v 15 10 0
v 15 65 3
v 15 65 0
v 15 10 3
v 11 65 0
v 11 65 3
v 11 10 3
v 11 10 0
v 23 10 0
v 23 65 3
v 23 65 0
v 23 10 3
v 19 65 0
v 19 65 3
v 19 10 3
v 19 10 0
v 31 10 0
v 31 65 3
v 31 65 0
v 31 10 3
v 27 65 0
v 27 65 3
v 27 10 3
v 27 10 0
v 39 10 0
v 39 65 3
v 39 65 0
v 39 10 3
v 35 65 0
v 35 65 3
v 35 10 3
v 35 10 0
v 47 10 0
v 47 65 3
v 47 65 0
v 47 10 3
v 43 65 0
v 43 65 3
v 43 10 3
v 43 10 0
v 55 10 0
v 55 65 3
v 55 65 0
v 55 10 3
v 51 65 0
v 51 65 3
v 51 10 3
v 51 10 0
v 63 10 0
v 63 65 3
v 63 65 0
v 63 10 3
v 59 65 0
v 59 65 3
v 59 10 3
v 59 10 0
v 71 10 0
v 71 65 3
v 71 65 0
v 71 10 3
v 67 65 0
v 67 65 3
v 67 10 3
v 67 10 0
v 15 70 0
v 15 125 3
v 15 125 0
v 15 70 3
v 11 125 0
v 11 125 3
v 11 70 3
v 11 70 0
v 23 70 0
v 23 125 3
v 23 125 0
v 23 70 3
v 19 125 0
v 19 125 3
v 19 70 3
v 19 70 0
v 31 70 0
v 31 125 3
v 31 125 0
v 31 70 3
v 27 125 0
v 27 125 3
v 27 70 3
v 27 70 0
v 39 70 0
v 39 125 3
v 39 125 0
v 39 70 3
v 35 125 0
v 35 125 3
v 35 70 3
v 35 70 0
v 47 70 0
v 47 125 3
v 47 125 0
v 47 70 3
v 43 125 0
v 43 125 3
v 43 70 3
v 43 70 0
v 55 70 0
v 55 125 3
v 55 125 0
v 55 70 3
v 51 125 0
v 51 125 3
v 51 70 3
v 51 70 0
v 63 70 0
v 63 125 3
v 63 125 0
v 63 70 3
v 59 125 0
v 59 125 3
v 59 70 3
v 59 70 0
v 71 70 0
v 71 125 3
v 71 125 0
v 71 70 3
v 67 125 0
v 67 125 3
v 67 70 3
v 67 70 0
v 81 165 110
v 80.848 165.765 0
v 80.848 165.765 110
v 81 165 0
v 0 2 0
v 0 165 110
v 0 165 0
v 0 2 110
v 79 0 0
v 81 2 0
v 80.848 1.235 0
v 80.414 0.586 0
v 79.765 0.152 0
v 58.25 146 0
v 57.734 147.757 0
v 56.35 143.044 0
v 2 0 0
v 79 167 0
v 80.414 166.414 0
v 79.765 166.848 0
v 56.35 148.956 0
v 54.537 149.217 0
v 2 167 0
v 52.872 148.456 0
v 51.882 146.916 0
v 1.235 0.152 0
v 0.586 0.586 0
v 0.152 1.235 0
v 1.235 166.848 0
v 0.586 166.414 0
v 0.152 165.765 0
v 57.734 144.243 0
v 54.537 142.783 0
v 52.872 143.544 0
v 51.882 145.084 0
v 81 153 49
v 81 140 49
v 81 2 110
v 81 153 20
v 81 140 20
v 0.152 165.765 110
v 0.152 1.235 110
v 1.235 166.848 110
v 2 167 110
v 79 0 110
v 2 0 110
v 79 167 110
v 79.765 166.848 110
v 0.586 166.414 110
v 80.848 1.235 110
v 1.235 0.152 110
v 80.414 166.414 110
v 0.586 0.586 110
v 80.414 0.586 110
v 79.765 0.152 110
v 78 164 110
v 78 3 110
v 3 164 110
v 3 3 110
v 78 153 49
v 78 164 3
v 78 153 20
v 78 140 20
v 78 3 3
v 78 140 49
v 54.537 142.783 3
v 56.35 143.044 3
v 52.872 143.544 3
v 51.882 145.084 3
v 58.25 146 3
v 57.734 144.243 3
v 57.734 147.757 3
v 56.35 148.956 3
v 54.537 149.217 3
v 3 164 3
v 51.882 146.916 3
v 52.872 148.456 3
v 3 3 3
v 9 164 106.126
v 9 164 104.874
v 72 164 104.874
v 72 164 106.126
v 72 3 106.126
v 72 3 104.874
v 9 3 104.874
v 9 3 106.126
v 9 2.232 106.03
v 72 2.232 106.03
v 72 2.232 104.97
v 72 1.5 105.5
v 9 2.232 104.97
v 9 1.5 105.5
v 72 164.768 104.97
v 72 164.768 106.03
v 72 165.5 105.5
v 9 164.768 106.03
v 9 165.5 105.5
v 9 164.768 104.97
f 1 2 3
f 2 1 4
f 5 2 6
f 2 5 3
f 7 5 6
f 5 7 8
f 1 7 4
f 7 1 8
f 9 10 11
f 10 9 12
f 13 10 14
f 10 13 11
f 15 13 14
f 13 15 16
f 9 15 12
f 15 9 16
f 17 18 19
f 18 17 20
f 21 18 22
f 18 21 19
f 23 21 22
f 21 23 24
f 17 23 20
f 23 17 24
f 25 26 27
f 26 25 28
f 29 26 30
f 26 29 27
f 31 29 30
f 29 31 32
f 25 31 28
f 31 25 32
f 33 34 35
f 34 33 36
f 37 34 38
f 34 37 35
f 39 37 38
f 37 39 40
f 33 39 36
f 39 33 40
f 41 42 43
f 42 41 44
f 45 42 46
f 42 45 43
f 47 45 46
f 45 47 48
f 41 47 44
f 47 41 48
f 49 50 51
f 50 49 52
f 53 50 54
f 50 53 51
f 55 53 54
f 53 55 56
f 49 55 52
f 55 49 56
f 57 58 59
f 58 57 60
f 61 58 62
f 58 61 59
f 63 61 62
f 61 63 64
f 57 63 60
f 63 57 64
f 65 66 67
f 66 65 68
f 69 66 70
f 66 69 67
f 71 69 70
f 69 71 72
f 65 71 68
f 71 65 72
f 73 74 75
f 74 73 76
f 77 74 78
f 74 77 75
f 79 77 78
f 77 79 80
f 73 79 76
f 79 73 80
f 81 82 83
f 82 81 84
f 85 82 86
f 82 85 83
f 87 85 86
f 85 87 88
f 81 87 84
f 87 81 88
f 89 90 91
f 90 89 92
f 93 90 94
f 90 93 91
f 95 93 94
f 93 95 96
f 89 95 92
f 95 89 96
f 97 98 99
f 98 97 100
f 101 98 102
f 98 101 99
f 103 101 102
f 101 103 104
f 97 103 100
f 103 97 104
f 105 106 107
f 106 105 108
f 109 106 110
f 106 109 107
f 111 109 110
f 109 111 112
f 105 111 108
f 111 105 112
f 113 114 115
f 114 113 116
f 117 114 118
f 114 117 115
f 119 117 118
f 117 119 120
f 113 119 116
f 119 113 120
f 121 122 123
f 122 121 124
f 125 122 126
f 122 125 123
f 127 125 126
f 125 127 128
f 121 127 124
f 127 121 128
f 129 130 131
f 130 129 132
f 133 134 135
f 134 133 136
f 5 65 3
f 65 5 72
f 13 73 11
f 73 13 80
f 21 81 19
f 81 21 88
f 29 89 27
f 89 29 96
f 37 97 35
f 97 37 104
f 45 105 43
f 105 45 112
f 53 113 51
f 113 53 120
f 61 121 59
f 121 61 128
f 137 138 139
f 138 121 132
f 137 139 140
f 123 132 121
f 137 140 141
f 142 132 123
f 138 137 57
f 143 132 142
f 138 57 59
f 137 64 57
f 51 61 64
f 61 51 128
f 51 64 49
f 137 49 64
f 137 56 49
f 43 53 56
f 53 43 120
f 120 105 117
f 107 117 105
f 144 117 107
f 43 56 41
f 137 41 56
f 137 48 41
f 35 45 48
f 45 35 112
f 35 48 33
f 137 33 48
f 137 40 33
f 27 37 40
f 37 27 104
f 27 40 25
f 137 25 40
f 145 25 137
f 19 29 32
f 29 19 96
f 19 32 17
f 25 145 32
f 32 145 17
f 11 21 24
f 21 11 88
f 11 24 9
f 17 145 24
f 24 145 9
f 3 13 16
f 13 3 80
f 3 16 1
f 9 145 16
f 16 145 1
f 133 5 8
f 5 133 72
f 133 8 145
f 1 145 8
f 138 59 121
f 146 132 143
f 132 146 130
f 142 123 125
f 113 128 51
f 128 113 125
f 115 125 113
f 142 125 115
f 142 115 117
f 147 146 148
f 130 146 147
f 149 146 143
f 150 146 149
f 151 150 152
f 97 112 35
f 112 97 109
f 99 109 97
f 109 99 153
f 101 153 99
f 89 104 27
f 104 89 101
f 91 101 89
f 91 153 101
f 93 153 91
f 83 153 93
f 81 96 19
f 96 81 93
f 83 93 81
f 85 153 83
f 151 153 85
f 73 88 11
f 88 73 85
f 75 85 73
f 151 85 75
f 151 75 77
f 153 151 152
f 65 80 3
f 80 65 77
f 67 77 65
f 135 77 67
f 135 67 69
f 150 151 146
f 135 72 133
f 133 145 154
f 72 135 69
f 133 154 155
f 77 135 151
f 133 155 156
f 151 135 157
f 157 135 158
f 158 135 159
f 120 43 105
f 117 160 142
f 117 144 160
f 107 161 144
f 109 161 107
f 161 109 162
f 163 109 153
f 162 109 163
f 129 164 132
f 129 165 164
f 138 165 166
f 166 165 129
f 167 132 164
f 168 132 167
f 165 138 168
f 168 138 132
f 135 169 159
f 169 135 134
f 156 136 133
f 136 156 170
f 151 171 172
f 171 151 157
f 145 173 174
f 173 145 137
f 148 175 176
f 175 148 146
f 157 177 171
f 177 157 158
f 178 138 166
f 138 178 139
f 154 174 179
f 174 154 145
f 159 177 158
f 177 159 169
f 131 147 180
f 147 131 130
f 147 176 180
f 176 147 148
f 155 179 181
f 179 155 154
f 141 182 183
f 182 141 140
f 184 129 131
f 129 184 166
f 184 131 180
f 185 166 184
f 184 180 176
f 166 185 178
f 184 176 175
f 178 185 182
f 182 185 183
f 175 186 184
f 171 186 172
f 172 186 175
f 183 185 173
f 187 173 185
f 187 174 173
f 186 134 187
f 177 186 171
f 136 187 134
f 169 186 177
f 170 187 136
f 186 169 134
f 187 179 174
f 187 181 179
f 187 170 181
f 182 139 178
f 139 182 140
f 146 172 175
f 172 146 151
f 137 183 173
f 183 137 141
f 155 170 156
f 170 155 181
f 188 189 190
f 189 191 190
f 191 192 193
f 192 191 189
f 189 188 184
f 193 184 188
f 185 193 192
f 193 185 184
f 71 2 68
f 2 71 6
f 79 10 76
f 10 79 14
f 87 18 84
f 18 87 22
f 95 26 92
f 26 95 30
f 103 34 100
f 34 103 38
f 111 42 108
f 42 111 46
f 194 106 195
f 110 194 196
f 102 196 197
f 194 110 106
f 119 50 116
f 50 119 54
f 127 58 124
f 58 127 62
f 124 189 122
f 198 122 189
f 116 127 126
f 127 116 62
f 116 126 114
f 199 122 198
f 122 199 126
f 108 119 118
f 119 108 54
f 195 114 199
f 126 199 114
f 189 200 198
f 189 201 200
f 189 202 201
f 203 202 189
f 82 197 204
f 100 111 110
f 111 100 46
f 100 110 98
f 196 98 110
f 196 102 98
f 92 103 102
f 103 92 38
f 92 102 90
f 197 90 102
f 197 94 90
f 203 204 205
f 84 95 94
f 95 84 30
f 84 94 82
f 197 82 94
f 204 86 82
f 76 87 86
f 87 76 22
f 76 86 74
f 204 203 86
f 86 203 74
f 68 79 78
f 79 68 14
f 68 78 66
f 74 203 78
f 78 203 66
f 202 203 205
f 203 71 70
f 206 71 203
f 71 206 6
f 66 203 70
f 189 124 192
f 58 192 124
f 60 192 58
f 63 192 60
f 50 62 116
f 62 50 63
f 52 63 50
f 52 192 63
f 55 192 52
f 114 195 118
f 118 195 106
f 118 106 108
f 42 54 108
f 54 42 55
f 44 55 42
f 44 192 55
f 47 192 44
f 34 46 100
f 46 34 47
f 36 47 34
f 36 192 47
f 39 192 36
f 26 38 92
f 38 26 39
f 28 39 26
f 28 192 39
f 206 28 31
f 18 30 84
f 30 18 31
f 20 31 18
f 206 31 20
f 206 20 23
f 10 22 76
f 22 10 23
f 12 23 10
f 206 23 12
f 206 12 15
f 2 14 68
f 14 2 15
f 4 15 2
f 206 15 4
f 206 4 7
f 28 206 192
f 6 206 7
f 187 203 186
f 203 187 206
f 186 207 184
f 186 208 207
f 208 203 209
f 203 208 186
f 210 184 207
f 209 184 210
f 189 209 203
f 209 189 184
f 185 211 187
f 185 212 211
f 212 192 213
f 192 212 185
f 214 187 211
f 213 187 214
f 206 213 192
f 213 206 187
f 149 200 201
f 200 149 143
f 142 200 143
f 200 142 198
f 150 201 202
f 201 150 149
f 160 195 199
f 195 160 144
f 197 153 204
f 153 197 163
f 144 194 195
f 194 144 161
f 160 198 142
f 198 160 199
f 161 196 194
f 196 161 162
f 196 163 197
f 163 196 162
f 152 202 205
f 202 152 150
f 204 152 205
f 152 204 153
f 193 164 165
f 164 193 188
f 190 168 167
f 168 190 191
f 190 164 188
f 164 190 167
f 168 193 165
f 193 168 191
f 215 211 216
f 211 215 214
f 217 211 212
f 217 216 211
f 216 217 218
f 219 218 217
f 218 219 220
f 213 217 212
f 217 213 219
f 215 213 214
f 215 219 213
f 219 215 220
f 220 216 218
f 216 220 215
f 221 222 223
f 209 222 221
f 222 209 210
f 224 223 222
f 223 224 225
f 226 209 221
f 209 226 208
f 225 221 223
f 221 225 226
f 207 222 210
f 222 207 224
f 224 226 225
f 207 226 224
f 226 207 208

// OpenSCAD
module respiracion(){
    translate([0,0,-1])
hull(){
translate([0,50,0])
cube([4,5,5]);
cube([4,5,5]);
}
}

difference(){
    hull(){
        translate([2,2,0])
        cylinder(r=2,h=110,$fn=16);

        translate([81,0,0])
        translate([-2,2,0])
        cylinder(r=2,h=110,$fn=16);

        translate([0,167,0])
        translate([2,-2,0])
        cylinder(r=2,h=110,$fn=16);

        translate([81,167,0])
        translate([-2,-2,0])
        cylinder(r=2,h=110,$fn=16);
    }
    translate([(81-75)/2,(167-161)/2,3])
    color("red")
    cube([75,161,111]);
    translate([55,146,-10])
    cylinder(d=6.5,h=50);

translate([3,0,0])
for(i = [1 : 1: 8]) {
    translate([8*i,10,0])
    respiracion();
}
translate([3,60,0])
for(i = [1 : 1: 8]) {
    translate([8*i,10,0])
    respiracion();
}


translate([75,140,20])
cube([10,13,29]);

translate([63/2+(81-63)/2,5.5-1.5,110-4.5])
scale([1,1,0.3])
rotate([0,90,0])
cylinder(d=5,h=63,center=true);

translate([63/2+(81-63)/2,5.5-1.5+157.5+1.5,110-4.5])
scale([1,1,0.3])
rotate([0,90,0])
cylinder(d=5,h=63,center=true);
}
